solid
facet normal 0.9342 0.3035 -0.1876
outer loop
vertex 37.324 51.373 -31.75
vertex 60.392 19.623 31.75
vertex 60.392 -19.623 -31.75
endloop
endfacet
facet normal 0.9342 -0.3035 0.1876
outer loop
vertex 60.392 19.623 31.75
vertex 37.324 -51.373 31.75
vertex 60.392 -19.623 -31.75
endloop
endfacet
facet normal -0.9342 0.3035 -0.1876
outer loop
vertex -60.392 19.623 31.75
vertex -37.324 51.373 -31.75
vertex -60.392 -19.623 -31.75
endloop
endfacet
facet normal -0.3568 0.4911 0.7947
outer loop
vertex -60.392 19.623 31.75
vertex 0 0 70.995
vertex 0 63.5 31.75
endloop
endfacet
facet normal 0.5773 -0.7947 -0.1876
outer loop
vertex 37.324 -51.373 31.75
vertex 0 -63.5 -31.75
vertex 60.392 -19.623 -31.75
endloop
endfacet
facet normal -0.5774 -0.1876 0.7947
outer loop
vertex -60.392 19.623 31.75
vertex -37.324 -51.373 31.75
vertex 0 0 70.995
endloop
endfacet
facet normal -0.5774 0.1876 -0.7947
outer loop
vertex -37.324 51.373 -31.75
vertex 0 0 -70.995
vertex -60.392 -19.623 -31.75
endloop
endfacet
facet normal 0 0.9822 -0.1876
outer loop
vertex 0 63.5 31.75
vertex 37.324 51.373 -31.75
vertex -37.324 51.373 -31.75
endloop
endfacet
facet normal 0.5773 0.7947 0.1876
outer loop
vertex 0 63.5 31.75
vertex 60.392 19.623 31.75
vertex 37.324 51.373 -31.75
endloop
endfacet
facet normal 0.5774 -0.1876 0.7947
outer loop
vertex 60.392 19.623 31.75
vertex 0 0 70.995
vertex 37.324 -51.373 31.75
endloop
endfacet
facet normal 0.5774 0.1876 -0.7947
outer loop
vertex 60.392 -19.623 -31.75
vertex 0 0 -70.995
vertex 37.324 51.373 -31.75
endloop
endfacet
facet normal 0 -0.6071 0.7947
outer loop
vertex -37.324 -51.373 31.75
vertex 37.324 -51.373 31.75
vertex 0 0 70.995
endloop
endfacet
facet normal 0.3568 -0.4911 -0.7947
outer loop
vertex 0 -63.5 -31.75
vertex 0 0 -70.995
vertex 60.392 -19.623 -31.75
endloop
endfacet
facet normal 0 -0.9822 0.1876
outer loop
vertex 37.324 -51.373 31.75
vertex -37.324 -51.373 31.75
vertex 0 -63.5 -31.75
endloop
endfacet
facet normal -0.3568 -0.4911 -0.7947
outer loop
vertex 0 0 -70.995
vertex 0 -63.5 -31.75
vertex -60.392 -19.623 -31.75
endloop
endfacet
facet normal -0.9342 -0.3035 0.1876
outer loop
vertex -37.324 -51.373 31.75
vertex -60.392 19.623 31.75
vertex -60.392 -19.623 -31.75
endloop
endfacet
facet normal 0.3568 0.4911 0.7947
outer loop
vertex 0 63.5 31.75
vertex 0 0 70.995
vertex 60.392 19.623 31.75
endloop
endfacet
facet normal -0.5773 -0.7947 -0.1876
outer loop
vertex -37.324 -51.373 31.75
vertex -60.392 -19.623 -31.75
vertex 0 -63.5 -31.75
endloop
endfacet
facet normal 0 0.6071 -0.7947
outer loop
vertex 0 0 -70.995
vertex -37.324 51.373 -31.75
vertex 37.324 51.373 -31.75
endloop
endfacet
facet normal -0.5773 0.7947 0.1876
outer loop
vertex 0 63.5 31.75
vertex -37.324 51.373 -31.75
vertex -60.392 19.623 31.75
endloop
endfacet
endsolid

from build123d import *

# Parameters (mm, degrees)
F12_DEPTH      = 37.3243635206
F12_DEPTH_BACK = 37.3243635206
F15_DEPTH      = 37.3243635206
F15_DEPTH_BACK = 37.3243635206
F18_DEPTH      = 37.3243635206
F18_DEPTH_BACK = 37.3243635206
F21_DEPTH      = 37.3243635206
F21_DEPTH_BACK = 37.3243635206
F24_DEPTH      = 37.3243635206
F24_DEPTH_BACK = 37.3243635206
F28_DEPTH      = 99.1671965959
F28_DEPTH_BACK = 99.1671965959
F32_DEPTH      = 89.4601183415
F32_DEPTH_BACK = 89.4601183415
F35_DEPTH      = 89.4601183415
F35_DEPTH_BACK = 88.5596960493
F39_DEPTH      = 99.1671965959
F39_DEPTH_BACK = 96.8098604305
F42_DEPTH      = 68.0823305395
F42_DEPTH_BACK = 70.9961582856
F45_DEPTH      = 92.4043169267
F45_DEPTH_BACK = 99.1671965959
F48_DEPTH      = 81.4313769211
F48_DEPTH_BACK = 89.4601183415
F52_DEPTH      = 88.5596960493
F52_DEPTH_BACK = 82.3317992133
F56_DEPTH      = 92.4043169267
F56_DEPTH_BACK = 96.8098604305
F59_DEPTH      = 68.0823305395
F59_DEPTH_BACK = 68.0823305395
F62_DEPTH      = 37.3243635206
F62_DEPTH_BACK = 37.3243635206
F65_DEPTH      = 68.0823305395
F65_DEPTH_BACK = 68.0823305395
F68_DEPTH      = 81.4313769211
F68_DEPTH_BACK = 81.4313769211
F71_DEPTH      = 92.4043169267
F71_DEPTH_BACK = 92.4043169267
F74_DEPTH      = 92.4043169267
F74_DEPTH_BACK = 92.4043169267


# Not quite as in the source:
# - a feature names something its author has since deleted; it is built from what else it names


with BuildPart() as f9:
    # F7 (on Front) → F9 (revolve)
    with BuildSketch(Plane.XZ):
        with BuildLine():
            Line((0, 0), (0, 31.75))
            Line((0, 31.75), (0, 70.9951582856))
            ThreePointArc((0, 70.9951582856), (-70.9951582856, 0), (0, -70.9951582856))
            Line((0, -70.9951582856), (0, -31.75))
            Line((0, -31.75), (0, 0))
        make_face()
    revolve(axis=Axis((0, 0, -35.4975791428), (0, 0, -1)))

    # F11 (on 3pt) → F12 (cut, two sides)
    with BuildSketch(Plane(origin=(0, 0, 0), x_dir=(-0.5877852523, 0.8090169944, 0), z_dir=(0.8090169944, 0.5877852523, 0))) as f12_sk:
        Polygon((-63.5, -70.9951582856), (0, -70.9951582856), (-51.3725791428, -31.75), (-63.5, -31.75), align=None)
    extrude(amount=F12_DEPTH, mode=Mode.SUBTRACT)
    extrude(f12_sk.sketch, amount=-F12_DEPTH_BACK, mode=Mode.SUBTRACT)

    # F14 (on 3pt) → F15 (cut, two sides)
    with BuildSketch(Plane(origin=(0, 0, 0), x_dir=(-0.5877852523, -0.8090169944, 0), z_dir=(-0.8090169944, 0.5877852523, 0))) as f15_sk:
        Polygon((51.3725791428, -31.75), (0, -70.9951582856), (63.5, -70.9951582856), (63.5, -31.75), align=None)
    extrude(amount=-F15_DEPTH, mode=Mode.SUBTRACT)
    extrude(f15_sk.sketch, amount=F15_DEPTH_BACK, mode=Mode.SUBTRACT)

    # F17 (on 3pt) → F18 (cut, two sides)
    with BuildSketch(Plane(origin=(0, 0, 0), x_dir=(0.9510565163, -0.3090169944, 0), z_dir=(-0.3090169944, -0.9510565163, 0))) as f18_sk:
        Polygon((-63.5, -70.9951582856), (0, -70.9951582856), (-51.3725791428, -31.75), (-63.5, -31.75), align=None)
    extrude(amount=-F18_DEPTH, mode=Mode.SUBTRACT)
    extrude(f18_sk.sketch, amount=F18_DEPTH_BACK, mode=Mode.SUBTRACT)

    # F20 (on 3pt) → F21 (cut, two sides)
    with BuildSketch(Plane.YZ) as f21_sk:
        Polygon((51.3725791428, -31.75), (0, -70.9951582856), (63.5, -70.9951582856), (63.5, -31.75), align=None)
    extrude(amount=-F21_DEPTH, mode=Mode.SUBTRACT)
    extrude(f21_sk.sketch, amount=F21_DEPTH_BACK, mode=Mode.SUBTRACT)

    # F23 (on 3pt) → F24 (cut, two sides)
    with BuildSketch(Plane(origin=(0, 0, 0), x_dir=(-0.9510565163, -0.3090169944, 0), z_dir=(-0.3090169944, 0.9510565163, 0))) as f24_sk:
        Polygon((-63.5, -70.9951582856), (0, -70.9951582856), (-51.3725791428, -31.75), (-63.5, -31.75), align=None)
    extrude(amount=F24_DEPTH, mode=Mode.SUBTRACT)
    extrude(f24_sk.sketch, amount=-F24_DEPTH_BACK, mode=Mode.SUBTRACT)

    # F27 (on 3pt) → F28 (cut, two sides)
    with BuildSketch(Plane(origin=(0, 0, 0), x_dir=(-0.5877852523, 0.8090169944, 0), z_dir=(0.8090169944, 0.5877852523, 0))) as f28_sk:
        Polygon((-70.9951582856, -31.75), (-51.3725791428, -31.75), (-63.5, 31.75), (-70.9951582856, 31.75), align=None)
    extrude(amount=F28_DEPTH, mode=Mode.SUBTRACT)
    extrude(f28_sk.sketch, amount=-F28_DEPTH_BACK, mode=Mode.SUBTRACT)

    # F31 (on 3pt) → F32 (cut, two sides)
    with BuildSketch(Plane(origin=(0, 0, 0), x_dir=(0.9510565163, -0.3090169944, 0), z_dir=(-0.3090169944, -0.9510565163, 0))) as f32_sk:
        Polygon((70.9951582856, 31.75), (51.3725791428, 31.75), (63.5, -31.75), (70.9951582856, -31.75), align=None)
    extrude(amount=-F32_DEPTH, mode=Mode.SUBTRACT)
    extrude(f32_sk.sketch, amount=F32_DEPTH_BACK, mode=Mode.SUBTRACT)

    # F34 (on 3pt) → F35 (cut, two sides)
    with BuildSketch(Plane(origin=(0, 0, 0), x_dir=(0.9510565163, 0.3090169944, 0), z_dir=(0.3090169944, -0.9510565163, 0))) as f35_sk:
        Polygon((63.5, 31.75), (51.3725791428, -31.75), (70.9951582856, -31.75), (70.9951582856, 31.75), align=None)
    extrude(amount=-F35_DEPTH, mode=Mode.SUBTRACT)
    extrude(f35_sk.sketch, amount=F35_DEPTH_BACK, mode=Mode.SUBTRACT)

    # F38 (on 3pt) → F39 (cut, two sides)
    with BuildSketch(Plane(origin=(0, 0, 0), x_dir=(0.5877852523, 0.8090169944, 0), z_dir=(0.8090169944, -0.5877852523, 0))) as f39_sk:
        Polygon((70.9951582856, 31.75), (51.3725791428, 31.75), (63.5, -31.75), (70.9951582856, -31.75), align=None)
    extrude(amount=-F39_DEPTH, mode=Mode.SUBTRACT)
    extrude(f39_sk.sketch, amount=F39_DEPTH_BACK, mode=Mode.SUBTRACT)

    # F41 (on 3pt) → F42 (cut, two sides)
    with BuildSketch(Plane(origin=(0, 0, 0), x_dir=(0, -1, 0), z_dir=(-1, 0, 0))) as f42_sk:
        Polygon((-70.9951582856, -31.75), (-51.3725791428, -31.75), (-63.5, 31.75), (-70.9951582856, 31.75), align=None)
    extrude(amount=-F42_DEPTH, mode=Mode.SUBTRACT)
    extrude(f42_sk.sketch, amount=F42_DEPTH_BACK, mode=Mode.SUBTRACT)

    # F44 (on 3pt) → F45 (cut, two sides)
    with BuildSketch(Plane(origin=(0, 0, 0), x_dir=(0.5877852523, -0.8090169944, 0), z_dir=(-0.8090169944, -0.5877852523, 0))) as f45_sk:
        Polygon((-63.5, -31.75), (-51.3725791428, 31.75), (-70.9951582856, 31.75), (-70.9951582856, -31.75), align=None)
    extrude(amount=-F45_DEPTH, mode=Mode.SUBTRACT)
    extrude(f45_sk.sketch, amount=F45_DEPTH_BACK, mode=Mode.SUBTRACT)

    # F47 (on 3pt) → F48 (cut, two sides)
    with BuildSketch(Plane(origin=(0, 0, 0), x_dir=(0.9510565163, -0.3090169944, 0), z_dir=(-0.3090169944, -0.9510565163, 0))) as f48_sk:
        Polygon((-70.9951582856, -31.75), (-51.3725791428, -31.75), (-63.5, 31.75), (-70.9951582856, 31.75), align=None)
    extrude(amount=-F48_DEPTH, mode=Mode.SUBTRACT)
    extrude(f48_sk.sketch, amount=F48_DEPTH_BACK, mode=Mode.SUBTRACT)

    # F51 (on 3pt) → F52 (cut, two sides)
    with BuildSketch(Plane(origin=(0, 0, 0), x_dir=(-0.9510565163, -0.3090169944, 0), z_dir=(-0.3090169944, 0.9510565163, 0))) as f52_sk:
        Polygon((70.9951582856, 31.75), (51.3725791428, 31.75), (63.5, -31.75), (70.9951582856, -31.75), align=None)
    extrude(amount=-F52_DEPTH, mode=Mode.SUBTRACT)
    extrude(f52_sk.sketch, amount=F52_DEPTH_BACK, mode=Mode.SUBTRACT)

    # F55 (on 3pt) → F56 (cut, two sides)
    with BuildSketch(Plane(origin=(0, 0, 0), x_dir=(0.5877852523, 0.8090169944, 0), z_dir=(0.8090169944, -0.5877852523, 0))) as f56_sk:
        Polygon((-70.9951582856, -31.75), (-51.3725791428, -31.75), (-63.5, 31.75), (-70.9951582856, 31.75), align=None)
    extrude(amount=-F56_DEPTH, mode=Mode.SUBTRACT)
    extrude(f56_sk.sketch, amount=F56_DEPTH_BACK, mode=Mode.SUBTRACT)

    # F58 (on 3pt) → F59 (cut, two sides)
    with BuildSketch(Plane(origin=(0, 0, 0), x_dir=(0, -1, 0), z_dir=(-1, 0, 0))) as f59_sk:
        Polygon((70.9951582856, 31.75), (51.3725791428, 31.75), (63.5, -31.75), (70.9951582856, -31.75), align=None)
    extrude(amount=-F59_DEPTH, mode=Mode.SUBTRACT)
    extrude(f59_sk.sketch, amount=F59_DEPTH_BACK, mode=Mode.SUBTRACT)

    # F61 (on 3pt) → F62 (cut, two sides)
    with BuildSketch(Plane(origin=(0, 0, 0), x_dir=(0.9510565163, -0.3090169944, 0), z_dir=(-0.3090169944, -0.9510565163, 0))) as f62_sk:
        Polygon((63.5, 70.9951582856), (0, 70.9951582856), (51.3725791428, 31.75), (63.5, 31.75), align=None)
    extrude(amount=F62_DEPTH, mode=Mode.SUBTRACT)
    extrude(f62_sk.sketch, amount=-F62_DEPTH_BACK, mode=Mode.SUBTRACT)

    # F64 (on 3pt) → F65 (cut, two sides)
    with BuildSketch(Plane.YZ) as f65_sk:
        Polygon((-51.3725791428, 31.75), (0, 70.9951582856), (-63.5, 70.9951582856), (-63.5, 31.75), align=None)
    extrude(amount=-F65_DEPTH, mode=Mode.SUBTRACT)
    extrude(f65_sk.sketch, amount=F65_DEPTH_BACK, mode=Mode.SUBTRACT)

    # F67 (on 3pt) → F68 (cut, two sides)
    with BuildSketch(Plane(origin=(0, 0, 0), x_dir=(0.9510565163, 0.3090169944, 0), z_dir=(0.3090169944, -0.9510565163, 0))) as f68_sk:
        Polygon((-51.3725791428, 31.75), (0, 70.9951582856), (-63.5, 70.9951582856), (-63.5, 31.75), align=None)
    extrude(amount=-F68_DEPTH, mode=Mode.SUBTRACT)
    extrude(f68_sk.sketch, amount=F68_DEPTH_BACK, mode=Mode.SUBTRACT)

    # F70 (on 3pt) → F71 (cut, two sides)
    with BuildSketch(Plane(origin=(0, 0, 0), x_dir=(-0.5877852523, 0.8090169944, 0), z_dir=(0.8090169944, 0.5877852523, 0))) as f71_sk:
        Polygon((63.5, 70.9951582856), (0, 70.9951582856), (51.3725791428, 31.75), (63.5, 31.75), align=None)
    extrude(amount=-F71_DEPTH, mode=Mode.SUBTRACT)
    extrude(f71_sk.sketch, amount=F71_DEPTH_BACK, mode=Mode.SUBTRACT)

    # F73 (on 3pt) → F74 (cut, two sides)
    with BuildSketch(Plane(origin=(0, 0, 0), x_dir=(0.5877852523, 0.8090169944, 0), z_dir=(0.8090169944, -0.5877852523, 0))) as f74_sk:
        Polygon((63.5, 70.9951582856), (0, 70.9951582856), (51.3725791428, 31.75), (63.5, 31.75), align=None)
    extrude(amount=-F74_DEPTH, mode=Mode.SUBTRACT)
    extrude(f74_sk.sketch, amount=F74_DEPTH_BACK, mode=Mode.SUBTRACT)


solid = f9.part
